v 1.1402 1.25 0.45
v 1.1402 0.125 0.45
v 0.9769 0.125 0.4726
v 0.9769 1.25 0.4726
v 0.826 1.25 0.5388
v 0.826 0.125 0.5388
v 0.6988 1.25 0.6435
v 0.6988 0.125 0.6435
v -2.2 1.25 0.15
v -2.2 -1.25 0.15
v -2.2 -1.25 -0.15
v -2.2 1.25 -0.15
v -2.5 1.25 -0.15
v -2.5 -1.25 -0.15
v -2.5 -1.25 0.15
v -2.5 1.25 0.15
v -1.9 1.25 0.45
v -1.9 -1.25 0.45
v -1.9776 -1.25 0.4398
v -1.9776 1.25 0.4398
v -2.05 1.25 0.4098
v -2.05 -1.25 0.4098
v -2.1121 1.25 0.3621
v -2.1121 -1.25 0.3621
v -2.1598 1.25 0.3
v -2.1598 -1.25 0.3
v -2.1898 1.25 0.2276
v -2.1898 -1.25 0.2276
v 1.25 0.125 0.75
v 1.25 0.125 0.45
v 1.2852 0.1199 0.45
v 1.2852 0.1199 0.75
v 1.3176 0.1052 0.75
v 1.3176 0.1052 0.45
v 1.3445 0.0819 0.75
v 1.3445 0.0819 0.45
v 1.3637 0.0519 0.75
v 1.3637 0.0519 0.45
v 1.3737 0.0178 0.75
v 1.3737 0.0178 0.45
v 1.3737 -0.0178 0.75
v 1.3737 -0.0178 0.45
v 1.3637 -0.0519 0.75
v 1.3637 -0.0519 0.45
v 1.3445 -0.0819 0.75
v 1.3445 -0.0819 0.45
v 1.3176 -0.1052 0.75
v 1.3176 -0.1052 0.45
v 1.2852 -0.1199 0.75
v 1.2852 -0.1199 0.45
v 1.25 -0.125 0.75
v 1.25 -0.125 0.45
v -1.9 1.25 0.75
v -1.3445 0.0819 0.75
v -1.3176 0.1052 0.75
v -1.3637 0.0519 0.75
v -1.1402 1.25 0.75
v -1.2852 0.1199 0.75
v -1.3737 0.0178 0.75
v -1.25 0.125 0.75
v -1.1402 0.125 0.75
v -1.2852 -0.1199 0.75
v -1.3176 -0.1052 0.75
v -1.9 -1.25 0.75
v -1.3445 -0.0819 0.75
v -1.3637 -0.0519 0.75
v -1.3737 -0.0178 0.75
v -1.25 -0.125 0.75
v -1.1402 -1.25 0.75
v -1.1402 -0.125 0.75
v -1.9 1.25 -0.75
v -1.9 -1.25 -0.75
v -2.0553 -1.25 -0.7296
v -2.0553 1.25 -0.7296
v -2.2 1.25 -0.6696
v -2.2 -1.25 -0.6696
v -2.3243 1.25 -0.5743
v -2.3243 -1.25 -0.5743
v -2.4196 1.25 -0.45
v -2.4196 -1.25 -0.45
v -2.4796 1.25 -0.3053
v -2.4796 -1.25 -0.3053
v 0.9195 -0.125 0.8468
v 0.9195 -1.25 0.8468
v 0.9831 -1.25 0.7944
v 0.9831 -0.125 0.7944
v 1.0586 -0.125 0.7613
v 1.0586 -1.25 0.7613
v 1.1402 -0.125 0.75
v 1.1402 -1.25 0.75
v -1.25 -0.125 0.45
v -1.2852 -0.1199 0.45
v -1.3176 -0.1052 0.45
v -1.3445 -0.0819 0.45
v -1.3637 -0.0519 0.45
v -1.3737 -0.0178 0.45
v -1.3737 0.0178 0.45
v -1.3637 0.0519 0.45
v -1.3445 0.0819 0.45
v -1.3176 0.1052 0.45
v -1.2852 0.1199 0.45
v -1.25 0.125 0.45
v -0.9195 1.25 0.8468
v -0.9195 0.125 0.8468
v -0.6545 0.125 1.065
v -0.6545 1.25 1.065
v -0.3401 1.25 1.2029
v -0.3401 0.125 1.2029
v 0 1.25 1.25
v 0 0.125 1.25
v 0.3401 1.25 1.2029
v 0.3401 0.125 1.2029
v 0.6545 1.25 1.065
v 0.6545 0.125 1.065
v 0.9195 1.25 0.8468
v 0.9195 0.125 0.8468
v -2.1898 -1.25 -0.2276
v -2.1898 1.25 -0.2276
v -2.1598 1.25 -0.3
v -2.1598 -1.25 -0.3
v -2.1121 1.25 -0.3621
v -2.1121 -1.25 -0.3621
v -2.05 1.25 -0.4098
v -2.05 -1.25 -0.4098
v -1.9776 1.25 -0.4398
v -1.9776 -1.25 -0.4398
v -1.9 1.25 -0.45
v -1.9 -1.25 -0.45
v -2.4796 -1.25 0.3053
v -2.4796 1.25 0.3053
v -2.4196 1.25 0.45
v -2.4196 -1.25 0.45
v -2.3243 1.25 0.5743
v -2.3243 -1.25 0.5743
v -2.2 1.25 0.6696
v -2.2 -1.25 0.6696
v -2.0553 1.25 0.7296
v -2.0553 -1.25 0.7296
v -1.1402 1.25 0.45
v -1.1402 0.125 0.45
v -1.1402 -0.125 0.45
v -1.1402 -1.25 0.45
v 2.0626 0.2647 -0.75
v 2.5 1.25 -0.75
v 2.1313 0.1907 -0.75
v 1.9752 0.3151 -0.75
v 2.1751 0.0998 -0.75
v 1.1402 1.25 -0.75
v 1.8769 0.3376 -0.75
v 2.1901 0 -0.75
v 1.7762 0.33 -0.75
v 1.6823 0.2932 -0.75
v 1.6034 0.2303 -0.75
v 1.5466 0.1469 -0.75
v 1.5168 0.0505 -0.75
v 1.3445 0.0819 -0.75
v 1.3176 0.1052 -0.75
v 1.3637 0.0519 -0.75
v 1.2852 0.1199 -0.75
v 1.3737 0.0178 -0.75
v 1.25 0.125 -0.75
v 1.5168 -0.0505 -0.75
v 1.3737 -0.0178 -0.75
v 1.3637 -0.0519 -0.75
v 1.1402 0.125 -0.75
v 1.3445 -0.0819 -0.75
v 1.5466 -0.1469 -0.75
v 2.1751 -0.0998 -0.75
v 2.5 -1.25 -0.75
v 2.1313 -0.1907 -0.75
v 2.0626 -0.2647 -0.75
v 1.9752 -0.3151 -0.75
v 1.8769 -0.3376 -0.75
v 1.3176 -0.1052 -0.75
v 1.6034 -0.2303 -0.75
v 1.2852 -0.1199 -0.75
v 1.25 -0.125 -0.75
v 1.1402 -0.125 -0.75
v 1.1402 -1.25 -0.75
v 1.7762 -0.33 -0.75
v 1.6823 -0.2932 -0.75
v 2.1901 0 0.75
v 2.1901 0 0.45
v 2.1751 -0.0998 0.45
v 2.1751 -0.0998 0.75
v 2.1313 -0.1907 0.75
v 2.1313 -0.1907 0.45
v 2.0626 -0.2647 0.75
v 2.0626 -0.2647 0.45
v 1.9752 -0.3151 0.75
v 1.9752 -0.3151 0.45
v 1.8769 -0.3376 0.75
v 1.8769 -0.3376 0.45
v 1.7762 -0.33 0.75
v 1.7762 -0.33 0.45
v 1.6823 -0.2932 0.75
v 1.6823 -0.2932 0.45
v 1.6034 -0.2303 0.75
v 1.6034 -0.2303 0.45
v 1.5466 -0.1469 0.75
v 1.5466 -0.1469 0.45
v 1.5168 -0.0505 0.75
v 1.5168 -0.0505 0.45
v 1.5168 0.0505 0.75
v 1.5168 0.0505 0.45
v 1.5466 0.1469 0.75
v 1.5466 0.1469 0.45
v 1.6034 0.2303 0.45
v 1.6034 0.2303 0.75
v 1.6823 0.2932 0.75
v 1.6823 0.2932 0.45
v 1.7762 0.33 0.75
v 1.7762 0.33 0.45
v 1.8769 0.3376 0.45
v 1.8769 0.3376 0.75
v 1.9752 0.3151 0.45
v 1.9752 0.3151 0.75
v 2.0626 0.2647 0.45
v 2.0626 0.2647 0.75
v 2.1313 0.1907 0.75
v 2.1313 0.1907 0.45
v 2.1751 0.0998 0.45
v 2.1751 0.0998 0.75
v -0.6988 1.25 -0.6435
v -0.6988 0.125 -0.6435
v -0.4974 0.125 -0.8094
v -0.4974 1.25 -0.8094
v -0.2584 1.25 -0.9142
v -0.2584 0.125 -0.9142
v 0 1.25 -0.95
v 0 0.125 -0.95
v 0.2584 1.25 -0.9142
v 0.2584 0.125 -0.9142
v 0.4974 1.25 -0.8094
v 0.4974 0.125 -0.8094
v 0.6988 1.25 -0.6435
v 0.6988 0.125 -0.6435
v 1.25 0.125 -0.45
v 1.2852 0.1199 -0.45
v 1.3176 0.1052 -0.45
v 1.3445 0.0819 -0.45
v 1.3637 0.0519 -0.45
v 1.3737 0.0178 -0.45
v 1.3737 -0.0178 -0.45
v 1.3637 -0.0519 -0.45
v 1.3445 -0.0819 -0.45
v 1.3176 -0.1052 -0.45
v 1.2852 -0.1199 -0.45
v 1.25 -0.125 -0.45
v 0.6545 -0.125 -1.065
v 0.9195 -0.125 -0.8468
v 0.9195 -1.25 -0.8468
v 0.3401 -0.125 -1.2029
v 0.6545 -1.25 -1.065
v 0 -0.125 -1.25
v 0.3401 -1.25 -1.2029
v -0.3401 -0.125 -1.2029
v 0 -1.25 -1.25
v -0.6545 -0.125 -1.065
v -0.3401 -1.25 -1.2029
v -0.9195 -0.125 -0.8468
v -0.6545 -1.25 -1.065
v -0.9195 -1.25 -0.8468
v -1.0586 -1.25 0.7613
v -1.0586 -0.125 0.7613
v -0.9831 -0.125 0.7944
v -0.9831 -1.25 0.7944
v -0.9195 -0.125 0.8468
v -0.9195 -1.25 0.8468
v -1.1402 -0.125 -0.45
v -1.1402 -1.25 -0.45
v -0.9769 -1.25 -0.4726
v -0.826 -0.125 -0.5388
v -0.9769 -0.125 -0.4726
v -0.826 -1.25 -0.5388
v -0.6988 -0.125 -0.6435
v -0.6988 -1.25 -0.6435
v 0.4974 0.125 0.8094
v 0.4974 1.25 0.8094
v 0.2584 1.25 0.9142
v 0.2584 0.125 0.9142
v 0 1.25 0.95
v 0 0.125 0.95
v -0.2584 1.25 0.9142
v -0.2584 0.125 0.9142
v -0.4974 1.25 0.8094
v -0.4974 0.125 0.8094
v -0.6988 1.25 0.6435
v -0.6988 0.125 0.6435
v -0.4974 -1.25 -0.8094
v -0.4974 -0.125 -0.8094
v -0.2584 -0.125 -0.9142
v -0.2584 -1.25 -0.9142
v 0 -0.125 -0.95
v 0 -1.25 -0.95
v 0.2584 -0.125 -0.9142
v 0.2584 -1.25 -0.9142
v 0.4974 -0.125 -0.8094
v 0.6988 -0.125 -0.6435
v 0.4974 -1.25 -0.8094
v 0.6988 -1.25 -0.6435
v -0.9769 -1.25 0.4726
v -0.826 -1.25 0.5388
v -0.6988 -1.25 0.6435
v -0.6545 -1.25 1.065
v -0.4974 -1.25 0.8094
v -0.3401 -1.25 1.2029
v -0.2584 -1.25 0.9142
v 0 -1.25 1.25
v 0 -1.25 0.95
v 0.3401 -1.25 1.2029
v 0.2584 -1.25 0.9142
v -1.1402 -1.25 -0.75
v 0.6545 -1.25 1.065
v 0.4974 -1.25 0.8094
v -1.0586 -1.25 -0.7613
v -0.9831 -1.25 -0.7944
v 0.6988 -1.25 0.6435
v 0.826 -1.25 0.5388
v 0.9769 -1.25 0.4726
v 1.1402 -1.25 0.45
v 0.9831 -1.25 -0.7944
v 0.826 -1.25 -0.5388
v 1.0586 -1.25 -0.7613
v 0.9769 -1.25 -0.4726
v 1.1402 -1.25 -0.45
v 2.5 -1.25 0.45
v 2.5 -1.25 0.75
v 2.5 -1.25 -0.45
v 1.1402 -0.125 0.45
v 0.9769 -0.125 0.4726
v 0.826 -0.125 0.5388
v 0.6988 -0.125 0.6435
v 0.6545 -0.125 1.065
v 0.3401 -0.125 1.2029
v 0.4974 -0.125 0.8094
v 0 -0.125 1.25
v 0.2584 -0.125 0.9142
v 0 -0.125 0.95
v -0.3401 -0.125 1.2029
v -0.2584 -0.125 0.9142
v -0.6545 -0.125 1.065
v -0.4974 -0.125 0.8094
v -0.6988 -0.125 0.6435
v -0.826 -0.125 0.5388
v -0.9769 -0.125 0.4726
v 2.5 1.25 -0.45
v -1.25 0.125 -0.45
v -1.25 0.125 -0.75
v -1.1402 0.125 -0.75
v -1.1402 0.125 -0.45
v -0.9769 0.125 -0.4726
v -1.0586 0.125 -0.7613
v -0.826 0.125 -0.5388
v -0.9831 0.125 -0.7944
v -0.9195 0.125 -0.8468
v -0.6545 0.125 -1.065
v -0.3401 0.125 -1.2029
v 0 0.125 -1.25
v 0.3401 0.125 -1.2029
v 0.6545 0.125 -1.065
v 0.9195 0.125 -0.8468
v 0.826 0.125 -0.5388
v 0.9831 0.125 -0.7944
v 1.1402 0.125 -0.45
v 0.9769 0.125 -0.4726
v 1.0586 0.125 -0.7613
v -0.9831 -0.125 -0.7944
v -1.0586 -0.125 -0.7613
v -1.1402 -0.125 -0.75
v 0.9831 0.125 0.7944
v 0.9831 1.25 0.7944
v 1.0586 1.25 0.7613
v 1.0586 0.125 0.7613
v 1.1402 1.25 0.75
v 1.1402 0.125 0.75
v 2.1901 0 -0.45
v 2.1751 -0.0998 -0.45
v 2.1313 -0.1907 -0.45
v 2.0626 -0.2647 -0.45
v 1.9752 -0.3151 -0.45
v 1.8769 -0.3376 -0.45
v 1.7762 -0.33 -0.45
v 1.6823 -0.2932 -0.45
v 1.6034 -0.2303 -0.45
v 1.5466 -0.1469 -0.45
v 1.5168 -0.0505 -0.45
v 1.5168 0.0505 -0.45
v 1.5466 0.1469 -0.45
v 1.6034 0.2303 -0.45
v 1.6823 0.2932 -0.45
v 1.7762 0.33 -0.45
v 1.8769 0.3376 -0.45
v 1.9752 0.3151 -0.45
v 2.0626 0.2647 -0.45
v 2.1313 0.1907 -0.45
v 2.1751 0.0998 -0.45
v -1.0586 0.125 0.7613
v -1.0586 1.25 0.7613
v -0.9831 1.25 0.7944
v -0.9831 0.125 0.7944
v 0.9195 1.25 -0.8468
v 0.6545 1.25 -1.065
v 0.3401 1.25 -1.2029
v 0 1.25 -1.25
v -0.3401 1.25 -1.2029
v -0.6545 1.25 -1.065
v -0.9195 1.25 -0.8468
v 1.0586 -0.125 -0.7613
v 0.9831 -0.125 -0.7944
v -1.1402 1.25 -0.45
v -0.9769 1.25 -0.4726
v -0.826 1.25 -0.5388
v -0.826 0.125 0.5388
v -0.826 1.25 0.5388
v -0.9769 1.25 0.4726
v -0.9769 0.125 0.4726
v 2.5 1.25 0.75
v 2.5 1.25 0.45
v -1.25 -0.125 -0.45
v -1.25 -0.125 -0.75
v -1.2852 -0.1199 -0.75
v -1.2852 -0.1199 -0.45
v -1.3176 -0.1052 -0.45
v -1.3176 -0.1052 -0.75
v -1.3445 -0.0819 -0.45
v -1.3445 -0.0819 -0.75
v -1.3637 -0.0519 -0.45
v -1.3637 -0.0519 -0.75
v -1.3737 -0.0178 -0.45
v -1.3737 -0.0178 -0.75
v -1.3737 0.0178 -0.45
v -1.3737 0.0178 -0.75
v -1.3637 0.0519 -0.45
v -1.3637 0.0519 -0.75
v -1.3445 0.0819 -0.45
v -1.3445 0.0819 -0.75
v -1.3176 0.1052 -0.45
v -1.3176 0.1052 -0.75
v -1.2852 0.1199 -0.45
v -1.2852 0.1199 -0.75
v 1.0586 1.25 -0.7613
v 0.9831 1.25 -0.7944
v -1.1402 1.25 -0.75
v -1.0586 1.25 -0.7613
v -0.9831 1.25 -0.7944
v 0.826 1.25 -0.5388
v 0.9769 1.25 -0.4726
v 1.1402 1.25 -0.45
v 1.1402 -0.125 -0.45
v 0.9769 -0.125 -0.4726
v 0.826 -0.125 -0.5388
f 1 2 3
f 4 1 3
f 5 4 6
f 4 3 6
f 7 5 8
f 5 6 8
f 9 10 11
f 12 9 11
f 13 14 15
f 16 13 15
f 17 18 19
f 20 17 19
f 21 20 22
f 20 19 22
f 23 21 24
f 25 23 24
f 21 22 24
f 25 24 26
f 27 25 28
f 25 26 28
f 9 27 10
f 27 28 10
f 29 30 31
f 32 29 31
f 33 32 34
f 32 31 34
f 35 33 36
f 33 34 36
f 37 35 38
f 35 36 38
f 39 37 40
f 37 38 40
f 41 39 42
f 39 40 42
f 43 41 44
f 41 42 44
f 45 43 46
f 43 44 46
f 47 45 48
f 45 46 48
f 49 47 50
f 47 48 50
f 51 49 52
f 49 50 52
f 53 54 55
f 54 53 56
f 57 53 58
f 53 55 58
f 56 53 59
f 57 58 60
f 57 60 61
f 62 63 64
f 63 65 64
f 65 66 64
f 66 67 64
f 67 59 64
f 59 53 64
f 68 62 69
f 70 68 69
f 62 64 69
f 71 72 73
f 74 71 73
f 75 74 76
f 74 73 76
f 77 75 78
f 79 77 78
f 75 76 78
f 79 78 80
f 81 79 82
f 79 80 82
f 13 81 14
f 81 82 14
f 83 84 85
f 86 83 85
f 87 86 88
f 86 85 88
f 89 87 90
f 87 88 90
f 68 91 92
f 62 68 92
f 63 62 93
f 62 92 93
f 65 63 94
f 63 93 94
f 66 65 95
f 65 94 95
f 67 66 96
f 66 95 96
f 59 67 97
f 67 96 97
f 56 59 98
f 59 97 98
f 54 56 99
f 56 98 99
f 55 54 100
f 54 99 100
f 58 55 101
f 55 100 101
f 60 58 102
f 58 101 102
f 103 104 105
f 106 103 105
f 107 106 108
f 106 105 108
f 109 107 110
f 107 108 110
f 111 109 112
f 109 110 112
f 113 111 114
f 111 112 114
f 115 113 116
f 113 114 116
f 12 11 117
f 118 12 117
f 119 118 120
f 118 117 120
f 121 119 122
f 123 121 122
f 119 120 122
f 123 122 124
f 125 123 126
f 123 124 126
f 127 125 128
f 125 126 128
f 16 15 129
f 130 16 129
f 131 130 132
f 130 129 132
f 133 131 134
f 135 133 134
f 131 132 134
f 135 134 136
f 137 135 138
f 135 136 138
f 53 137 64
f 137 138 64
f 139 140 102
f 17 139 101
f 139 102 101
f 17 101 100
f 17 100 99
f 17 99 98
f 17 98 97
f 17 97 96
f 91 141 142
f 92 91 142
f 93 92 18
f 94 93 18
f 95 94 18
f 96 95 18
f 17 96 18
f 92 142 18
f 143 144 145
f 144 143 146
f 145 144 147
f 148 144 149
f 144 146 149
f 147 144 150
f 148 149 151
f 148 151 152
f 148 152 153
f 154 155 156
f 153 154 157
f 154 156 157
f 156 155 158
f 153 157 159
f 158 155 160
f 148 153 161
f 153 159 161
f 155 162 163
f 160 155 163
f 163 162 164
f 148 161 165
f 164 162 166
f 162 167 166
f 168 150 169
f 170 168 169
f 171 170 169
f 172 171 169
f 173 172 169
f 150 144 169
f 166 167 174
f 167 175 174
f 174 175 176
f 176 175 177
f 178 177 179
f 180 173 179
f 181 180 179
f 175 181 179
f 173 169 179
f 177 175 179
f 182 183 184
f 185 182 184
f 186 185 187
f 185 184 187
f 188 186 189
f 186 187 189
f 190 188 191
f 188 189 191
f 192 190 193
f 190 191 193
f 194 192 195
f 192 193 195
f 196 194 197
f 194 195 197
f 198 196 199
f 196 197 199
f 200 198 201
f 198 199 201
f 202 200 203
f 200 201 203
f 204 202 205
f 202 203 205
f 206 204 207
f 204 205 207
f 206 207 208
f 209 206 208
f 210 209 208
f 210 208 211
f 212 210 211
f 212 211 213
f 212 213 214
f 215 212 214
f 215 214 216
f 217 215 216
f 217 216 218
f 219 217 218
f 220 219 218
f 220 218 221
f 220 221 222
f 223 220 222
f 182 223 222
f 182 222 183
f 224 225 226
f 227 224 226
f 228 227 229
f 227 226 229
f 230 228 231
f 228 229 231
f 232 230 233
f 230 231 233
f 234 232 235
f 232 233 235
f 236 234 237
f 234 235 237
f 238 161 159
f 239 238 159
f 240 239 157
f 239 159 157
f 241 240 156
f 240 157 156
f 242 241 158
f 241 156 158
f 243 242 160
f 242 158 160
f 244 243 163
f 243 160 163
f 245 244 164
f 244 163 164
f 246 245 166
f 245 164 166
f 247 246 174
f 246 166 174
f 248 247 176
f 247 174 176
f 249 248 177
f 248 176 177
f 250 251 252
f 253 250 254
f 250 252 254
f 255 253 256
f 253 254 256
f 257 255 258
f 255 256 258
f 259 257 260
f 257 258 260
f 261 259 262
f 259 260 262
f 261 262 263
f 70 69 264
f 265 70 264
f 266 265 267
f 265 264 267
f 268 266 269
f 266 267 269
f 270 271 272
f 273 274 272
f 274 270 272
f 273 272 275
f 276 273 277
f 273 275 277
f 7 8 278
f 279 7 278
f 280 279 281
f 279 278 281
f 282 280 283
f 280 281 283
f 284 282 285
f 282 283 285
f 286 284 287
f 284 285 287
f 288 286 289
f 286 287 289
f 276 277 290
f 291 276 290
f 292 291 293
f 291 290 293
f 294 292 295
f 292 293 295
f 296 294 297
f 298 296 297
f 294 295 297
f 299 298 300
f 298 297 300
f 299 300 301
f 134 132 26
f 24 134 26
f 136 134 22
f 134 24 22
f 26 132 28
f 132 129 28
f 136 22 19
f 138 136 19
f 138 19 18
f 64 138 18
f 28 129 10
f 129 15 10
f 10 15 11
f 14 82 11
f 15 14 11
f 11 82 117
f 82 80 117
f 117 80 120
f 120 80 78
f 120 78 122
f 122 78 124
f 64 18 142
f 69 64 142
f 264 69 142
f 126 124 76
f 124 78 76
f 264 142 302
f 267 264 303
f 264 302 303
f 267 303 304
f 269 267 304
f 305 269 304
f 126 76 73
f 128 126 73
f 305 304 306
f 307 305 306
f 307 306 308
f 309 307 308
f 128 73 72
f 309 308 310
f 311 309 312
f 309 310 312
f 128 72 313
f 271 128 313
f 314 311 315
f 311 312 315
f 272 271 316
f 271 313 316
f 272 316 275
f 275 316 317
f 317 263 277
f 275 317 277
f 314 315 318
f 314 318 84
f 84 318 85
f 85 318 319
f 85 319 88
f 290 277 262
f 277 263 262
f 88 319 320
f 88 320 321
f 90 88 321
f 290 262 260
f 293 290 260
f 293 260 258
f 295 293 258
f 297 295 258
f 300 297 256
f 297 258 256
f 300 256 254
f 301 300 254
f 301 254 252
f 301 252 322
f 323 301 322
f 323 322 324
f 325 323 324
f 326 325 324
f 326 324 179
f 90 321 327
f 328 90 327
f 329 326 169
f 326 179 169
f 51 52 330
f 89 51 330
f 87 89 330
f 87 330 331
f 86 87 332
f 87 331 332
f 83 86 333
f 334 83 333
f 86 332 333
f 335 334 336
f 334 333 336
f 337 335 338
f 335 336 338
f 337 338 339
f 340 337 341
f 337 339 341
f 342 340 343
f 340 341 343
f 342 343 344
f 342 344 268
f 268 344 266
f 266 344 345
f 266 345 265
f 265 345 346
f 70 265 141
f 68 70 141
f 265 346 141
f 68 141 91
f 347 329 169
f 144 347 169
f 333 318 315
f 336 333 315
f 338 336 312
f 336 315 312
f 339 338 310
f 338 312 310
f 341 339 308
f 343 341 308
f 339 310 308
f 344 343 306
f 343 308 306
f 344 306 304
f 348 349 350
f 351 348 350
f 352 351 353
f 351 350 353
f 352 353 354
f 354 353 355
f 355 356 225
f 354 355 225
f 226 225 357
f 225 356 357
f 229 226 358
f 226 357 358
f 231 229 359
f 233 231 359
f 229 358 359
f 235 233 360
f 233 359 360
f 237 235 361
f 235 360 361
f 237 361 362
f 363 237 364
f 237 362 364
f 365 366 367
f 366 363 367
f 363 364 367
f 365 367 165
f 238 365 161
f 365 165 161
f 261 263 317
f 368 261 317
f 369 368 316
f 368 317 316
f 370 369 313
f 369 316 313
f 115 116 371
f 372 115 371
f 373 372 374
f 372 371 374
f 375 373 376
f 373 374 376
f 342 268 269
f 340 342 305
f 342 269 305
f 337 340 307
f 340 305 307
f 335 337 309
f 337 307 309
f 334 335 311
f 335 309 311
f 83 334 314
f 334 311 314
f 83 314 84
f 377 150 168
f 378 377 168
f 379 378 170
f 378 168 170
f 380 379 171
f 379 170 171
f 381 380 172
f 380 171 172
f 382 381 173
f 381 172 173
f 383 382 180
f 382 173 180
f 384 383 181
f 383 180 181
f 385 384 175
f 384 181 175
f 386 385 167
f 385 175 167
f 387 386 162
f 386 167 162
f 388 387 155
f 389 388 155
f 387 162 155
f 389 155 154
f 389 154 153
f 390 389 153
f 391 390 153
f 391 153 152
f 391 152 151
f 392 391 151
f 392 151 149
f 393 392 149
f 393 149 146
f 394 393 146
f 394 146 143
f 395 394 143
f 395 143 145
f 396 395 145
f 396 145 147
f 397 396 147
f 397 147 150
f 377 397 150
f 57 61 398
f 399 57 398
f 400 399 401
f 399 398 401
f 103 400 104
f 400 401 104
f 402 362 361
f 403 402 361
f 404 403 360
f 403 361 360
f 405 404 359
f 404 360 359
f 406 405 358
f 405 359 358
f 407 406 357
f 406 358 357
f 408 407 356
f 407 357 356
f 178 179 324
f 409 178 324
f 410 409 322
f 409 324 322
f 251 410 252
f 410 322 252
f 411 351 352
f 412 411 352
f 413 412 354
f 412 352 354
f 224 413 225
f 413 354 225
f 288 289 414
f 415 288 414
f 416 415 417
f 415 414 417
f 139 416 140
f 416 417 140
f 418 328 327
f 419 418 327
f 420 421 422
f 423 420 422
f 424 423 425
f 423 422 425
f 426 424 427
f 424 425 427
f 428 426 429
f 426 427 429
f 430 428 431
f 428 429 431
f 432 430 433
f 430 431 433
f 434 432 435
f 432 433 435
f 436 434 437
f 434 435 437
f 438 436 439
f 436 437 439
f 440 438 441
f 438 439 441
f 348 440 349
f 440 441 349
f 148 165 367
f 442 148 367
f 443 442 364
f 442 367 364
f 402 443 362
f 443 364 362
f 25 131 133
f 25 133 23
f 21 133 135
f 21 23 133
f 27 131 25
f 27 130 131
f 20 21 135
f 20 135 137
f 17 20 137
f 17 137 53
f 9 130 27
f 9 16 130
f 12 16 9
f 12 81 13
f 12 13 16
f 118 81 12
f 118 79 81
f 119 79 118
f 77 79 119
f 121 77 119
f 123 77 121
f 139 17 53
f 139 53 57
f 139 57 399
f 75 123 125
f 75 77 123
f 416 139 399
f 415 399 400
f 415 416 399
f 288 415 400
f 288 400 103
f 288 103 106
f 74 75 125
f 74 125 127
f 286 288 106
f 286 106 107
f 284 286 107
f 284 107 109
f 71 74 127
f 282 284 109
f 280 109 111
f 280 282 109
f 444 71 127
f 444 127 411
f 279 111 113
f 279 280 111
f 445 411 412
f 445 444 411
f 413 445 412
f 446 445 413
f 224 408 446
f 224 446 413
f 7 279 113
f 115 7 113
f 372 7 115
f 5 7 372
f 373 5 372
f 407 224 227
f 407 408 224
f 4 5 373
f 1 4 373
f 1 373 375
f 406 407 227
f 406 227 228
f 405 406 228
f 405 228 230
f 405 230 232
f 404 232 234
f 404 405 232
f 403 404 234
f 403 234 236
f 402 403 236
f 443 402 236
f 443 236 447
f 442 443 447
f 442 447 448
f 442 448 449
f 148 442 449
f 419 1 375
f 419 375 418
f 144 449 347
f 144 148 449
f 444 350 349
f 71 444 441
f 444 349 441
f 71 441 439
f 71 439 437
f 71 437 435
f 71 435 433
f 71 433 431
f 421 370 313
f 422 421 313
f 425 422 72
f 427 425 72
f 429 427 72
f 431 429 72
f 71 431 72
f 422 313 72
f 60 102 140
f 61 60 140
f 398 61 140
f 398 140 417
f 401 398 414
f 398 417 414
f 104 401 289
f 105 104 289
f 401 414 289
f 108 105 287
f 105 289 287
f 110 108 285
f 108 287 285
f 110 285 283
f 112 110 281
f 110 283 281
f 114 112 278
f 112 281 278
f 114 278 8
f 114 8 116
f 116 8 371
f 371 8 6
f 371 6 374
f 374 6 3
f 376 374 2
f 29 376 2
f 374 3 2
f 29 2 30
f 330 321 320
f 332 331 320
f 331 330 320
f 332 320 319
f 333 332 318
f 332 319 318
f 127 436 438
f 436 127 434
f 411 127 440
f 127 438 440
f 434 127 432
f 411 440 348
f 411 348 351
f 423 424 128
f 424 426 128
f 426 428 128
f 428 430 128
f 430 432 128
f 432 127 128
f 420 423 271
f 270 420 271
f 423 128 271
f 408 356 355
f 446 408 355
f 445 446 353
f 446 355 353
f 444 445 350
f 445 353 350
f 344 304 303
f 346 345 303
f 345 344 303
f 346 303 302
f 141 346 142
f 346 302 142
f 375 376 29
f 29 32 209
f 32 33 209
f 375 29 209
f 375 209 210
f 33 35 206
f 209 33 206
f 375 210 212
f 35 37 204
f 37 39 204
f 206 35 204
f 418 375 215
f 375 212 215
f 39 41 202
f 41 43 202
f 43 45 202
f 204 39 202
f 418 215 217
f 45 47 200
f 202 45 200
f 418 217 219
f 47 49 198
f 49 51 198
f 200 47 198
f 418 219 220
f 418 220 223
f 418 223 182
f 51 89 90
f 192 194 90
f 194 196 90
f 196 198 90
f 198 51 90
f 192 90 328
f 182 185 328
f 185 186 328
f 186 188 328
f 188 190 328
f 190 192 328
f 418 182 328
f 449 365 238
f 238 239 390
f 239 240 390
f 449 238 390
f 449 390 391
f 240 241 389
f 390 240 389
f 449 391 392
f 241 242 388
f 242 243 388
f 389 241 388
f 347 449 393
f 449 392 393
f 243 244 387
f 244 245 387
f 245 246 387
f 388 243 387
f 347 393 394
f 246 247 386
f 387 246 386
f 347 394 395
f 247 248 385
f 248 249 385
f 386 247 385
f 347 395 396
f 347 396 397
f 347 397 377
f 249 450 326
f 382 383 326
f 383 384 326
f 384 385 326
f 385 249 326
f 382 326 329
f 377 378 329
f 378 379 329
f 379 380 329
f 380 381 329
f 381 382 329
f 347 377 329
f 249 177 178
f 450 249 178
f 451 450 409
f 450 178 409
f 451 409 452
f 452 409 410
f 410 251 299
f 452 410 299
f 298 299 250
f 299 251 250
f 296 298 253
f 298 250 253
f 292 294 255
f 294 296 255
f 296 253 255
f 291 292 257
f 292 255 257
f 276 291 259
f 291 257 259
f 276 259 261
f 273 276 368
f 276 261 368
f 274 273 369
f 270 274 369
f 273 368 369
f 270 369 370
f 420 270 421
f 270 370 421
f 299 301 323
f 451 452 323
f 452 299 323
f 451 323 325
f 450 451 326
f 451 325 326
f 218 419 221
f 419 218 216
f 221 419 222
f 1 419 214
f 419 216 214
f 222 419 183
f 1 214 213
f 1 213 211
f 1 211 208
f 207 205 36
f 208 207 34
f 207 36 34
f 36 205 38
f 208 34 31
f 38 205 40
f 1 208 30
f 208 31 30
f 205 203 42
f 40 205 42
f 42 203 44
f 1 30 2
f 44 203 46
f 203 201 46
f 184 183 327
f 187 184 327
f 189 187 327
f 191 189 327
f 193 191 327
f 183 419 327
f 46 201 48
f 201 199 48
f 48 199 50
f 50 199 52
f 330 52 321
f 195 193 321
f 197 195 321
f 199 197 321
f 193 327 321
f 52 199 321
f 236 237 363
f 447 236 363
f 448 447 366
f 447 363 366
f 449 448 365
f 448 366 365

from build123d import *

# Parameters (mm, degrees)
BASE_FLANGE1_START      = -1.25
BASE_FLANGE1_DEPTH      = 2.5
SKETCH6_R               = 0.338529601
CUT_EXTRUDE1_DEPTH      = 4.436931771
CUT_EXTRUDE2_DEPTH      = 4.436931771
CUT_EXTRUDE2_DEPTH_BACK = 4.436931771


# Read off the part's stored shape, not the designer's step: Base-Flange1
with BuildPart() as part:
    # Base-Flange1 outline → Base-Flange1 (new body)
    with BuildSketch(Plane(origin=(0, 0, 0), x_dir=(1, 0, 0), z_dir=(0, 1, 0)).offset(BASE_FLANGE1_START)):
        with BuildLine():
            Line((1.140175425, 0.45), (2.5, 0.45))
            Line((2.5, 0.45), (2.5, 0.75))
            Line((2.5, 0.75), (1.140175425, 0.75))
            ThreePointArc((1.140175425, 0.75), (1.019692526, 0.775256718), (0.919496311, 0.846774194))
            ThreePointArc((0.919496311, 0.846774194), (0, 1.25), (-0.919496311, 0.846774194))
            ThreePointArc((-0.919496311, 0.846774194), (-1.019692526, 0.775256718), (-1.140175425, 0.75))
            Line((-1.140175425, 0.75), (-1.9, 0.75))
            ThreePointArc((-1.9, 0.75), (-2.324264069, 0.574264069), (-2.5, 0.15))
            Line((-2.5, 0.15), (-2.5, -0.15))
            ThreePointArc((-2.5, -0.15), (-2.324264069, -0.574264069), (-1.9, -0.75))
            Line((-1.9, -0.75), (-1.140175425, -0.75))
            ThreePointArc((-1.140175425, -0.75), (-1.019692526, -0.775256718), (-0.919496311, -0.846774194))
            ThreePointArc((-0.919496311, -0.846774194), (0, -1.25), (0.919496311, -0.846774194))
            ThreePointArc((0.919496311, -0.846774194), (1.019692526, -0.775256718), (1.140175425, -0.75))
            Line((1.140175425, -0.75), (2.5, -0.75))
            Line((2.5, -0.75), (2.5, -0.45))
            Line((2.5, -0.45), (1.140175425, -0.45))
            ThreePointArc((1.140175425, -0.45), (0.899209626, -0.500513436), (0.698817196, -0.643548387))
            ThreePointArc((0.698817196, -0.643548387), (0, -0.95), (-0.698817196, -0.643548387))
            ThreePointArc((-0.698817196, -0.643548387), (-0.899209626, -0.500513436), (-1.140175425, -0.45))
            Line((-1.140175425, -0.45), (-1.9, -0.45))
            ThreePointArc((-1.9, -0.45), (-2.112132034, -0.362132034), (-2.2, -0.15))
            Line((-2.2, -0.15), (-2.2, 0.15))
            ThreePointArc((-2.2, 0.15), (-2.112132034, 0.362132034), (-1.9, 0.45))
            Line((-1.9, 0.45), (-1.140175425, 0.45))
            ThreePointArc((-1.140175425, 0.45), (-0.899209626, 0.500513436), (-0.698817196, 0.643548387))
            ThreePointArc((-0.698817196, 0.643548387), (0, 0.95), (0.698817196, 0.643548387))
            ThreePointArc((0.698817196, 0.643548387), (0.899209626, 0.500513436), (1.140175425, 0.45))
        make_face()
    extrude(amount=BASE_FLANGE1_DEPTH)

    # Sketch6 → Cut-Extrude1 (cut, through all)
    with BuildSketch(Plane(origin=(0, 0, -0.75), x_dir=(-1, 0, 0), z_dir=(0, 0, -1))):
        with Locations(Location((-1.851561926, 0, 0), (0, 0, 180))):
            Circle(SKETCH6_R)
    extrude(amount=-CUT_EXTRUDE1_DEPTH, mode=Mode.SUBTRACT)

    # Sketch7 → Cut-Extrude2 (cut, two sides: drawn at the far end of the back side and taken through both)
    with BuildSketch(Plane.XY.offset(0.75).offset(-CUT_EXTRUDE2_DEPTH_BACK)):
        with BuildLine():
            Line((1.25, -0.125), (-1.25, -0.125))
            ThreePointArc((-1.25, -0.125), (-1.375, 0), (-1.25, 0.125))
            Line((-1.25, 0.125), (1.25, 0.125))
            ThreePointArc((1.25, 0.125), (1.375, 0), (1.25, -0.125))
        make_face()
    extrude(amount=CUT_EXTRUDE2_DEPTH + CUT_EXTRUDE2_DEPTH_BACK, mode=Mode.SUBTRACT)


solid = part.part
